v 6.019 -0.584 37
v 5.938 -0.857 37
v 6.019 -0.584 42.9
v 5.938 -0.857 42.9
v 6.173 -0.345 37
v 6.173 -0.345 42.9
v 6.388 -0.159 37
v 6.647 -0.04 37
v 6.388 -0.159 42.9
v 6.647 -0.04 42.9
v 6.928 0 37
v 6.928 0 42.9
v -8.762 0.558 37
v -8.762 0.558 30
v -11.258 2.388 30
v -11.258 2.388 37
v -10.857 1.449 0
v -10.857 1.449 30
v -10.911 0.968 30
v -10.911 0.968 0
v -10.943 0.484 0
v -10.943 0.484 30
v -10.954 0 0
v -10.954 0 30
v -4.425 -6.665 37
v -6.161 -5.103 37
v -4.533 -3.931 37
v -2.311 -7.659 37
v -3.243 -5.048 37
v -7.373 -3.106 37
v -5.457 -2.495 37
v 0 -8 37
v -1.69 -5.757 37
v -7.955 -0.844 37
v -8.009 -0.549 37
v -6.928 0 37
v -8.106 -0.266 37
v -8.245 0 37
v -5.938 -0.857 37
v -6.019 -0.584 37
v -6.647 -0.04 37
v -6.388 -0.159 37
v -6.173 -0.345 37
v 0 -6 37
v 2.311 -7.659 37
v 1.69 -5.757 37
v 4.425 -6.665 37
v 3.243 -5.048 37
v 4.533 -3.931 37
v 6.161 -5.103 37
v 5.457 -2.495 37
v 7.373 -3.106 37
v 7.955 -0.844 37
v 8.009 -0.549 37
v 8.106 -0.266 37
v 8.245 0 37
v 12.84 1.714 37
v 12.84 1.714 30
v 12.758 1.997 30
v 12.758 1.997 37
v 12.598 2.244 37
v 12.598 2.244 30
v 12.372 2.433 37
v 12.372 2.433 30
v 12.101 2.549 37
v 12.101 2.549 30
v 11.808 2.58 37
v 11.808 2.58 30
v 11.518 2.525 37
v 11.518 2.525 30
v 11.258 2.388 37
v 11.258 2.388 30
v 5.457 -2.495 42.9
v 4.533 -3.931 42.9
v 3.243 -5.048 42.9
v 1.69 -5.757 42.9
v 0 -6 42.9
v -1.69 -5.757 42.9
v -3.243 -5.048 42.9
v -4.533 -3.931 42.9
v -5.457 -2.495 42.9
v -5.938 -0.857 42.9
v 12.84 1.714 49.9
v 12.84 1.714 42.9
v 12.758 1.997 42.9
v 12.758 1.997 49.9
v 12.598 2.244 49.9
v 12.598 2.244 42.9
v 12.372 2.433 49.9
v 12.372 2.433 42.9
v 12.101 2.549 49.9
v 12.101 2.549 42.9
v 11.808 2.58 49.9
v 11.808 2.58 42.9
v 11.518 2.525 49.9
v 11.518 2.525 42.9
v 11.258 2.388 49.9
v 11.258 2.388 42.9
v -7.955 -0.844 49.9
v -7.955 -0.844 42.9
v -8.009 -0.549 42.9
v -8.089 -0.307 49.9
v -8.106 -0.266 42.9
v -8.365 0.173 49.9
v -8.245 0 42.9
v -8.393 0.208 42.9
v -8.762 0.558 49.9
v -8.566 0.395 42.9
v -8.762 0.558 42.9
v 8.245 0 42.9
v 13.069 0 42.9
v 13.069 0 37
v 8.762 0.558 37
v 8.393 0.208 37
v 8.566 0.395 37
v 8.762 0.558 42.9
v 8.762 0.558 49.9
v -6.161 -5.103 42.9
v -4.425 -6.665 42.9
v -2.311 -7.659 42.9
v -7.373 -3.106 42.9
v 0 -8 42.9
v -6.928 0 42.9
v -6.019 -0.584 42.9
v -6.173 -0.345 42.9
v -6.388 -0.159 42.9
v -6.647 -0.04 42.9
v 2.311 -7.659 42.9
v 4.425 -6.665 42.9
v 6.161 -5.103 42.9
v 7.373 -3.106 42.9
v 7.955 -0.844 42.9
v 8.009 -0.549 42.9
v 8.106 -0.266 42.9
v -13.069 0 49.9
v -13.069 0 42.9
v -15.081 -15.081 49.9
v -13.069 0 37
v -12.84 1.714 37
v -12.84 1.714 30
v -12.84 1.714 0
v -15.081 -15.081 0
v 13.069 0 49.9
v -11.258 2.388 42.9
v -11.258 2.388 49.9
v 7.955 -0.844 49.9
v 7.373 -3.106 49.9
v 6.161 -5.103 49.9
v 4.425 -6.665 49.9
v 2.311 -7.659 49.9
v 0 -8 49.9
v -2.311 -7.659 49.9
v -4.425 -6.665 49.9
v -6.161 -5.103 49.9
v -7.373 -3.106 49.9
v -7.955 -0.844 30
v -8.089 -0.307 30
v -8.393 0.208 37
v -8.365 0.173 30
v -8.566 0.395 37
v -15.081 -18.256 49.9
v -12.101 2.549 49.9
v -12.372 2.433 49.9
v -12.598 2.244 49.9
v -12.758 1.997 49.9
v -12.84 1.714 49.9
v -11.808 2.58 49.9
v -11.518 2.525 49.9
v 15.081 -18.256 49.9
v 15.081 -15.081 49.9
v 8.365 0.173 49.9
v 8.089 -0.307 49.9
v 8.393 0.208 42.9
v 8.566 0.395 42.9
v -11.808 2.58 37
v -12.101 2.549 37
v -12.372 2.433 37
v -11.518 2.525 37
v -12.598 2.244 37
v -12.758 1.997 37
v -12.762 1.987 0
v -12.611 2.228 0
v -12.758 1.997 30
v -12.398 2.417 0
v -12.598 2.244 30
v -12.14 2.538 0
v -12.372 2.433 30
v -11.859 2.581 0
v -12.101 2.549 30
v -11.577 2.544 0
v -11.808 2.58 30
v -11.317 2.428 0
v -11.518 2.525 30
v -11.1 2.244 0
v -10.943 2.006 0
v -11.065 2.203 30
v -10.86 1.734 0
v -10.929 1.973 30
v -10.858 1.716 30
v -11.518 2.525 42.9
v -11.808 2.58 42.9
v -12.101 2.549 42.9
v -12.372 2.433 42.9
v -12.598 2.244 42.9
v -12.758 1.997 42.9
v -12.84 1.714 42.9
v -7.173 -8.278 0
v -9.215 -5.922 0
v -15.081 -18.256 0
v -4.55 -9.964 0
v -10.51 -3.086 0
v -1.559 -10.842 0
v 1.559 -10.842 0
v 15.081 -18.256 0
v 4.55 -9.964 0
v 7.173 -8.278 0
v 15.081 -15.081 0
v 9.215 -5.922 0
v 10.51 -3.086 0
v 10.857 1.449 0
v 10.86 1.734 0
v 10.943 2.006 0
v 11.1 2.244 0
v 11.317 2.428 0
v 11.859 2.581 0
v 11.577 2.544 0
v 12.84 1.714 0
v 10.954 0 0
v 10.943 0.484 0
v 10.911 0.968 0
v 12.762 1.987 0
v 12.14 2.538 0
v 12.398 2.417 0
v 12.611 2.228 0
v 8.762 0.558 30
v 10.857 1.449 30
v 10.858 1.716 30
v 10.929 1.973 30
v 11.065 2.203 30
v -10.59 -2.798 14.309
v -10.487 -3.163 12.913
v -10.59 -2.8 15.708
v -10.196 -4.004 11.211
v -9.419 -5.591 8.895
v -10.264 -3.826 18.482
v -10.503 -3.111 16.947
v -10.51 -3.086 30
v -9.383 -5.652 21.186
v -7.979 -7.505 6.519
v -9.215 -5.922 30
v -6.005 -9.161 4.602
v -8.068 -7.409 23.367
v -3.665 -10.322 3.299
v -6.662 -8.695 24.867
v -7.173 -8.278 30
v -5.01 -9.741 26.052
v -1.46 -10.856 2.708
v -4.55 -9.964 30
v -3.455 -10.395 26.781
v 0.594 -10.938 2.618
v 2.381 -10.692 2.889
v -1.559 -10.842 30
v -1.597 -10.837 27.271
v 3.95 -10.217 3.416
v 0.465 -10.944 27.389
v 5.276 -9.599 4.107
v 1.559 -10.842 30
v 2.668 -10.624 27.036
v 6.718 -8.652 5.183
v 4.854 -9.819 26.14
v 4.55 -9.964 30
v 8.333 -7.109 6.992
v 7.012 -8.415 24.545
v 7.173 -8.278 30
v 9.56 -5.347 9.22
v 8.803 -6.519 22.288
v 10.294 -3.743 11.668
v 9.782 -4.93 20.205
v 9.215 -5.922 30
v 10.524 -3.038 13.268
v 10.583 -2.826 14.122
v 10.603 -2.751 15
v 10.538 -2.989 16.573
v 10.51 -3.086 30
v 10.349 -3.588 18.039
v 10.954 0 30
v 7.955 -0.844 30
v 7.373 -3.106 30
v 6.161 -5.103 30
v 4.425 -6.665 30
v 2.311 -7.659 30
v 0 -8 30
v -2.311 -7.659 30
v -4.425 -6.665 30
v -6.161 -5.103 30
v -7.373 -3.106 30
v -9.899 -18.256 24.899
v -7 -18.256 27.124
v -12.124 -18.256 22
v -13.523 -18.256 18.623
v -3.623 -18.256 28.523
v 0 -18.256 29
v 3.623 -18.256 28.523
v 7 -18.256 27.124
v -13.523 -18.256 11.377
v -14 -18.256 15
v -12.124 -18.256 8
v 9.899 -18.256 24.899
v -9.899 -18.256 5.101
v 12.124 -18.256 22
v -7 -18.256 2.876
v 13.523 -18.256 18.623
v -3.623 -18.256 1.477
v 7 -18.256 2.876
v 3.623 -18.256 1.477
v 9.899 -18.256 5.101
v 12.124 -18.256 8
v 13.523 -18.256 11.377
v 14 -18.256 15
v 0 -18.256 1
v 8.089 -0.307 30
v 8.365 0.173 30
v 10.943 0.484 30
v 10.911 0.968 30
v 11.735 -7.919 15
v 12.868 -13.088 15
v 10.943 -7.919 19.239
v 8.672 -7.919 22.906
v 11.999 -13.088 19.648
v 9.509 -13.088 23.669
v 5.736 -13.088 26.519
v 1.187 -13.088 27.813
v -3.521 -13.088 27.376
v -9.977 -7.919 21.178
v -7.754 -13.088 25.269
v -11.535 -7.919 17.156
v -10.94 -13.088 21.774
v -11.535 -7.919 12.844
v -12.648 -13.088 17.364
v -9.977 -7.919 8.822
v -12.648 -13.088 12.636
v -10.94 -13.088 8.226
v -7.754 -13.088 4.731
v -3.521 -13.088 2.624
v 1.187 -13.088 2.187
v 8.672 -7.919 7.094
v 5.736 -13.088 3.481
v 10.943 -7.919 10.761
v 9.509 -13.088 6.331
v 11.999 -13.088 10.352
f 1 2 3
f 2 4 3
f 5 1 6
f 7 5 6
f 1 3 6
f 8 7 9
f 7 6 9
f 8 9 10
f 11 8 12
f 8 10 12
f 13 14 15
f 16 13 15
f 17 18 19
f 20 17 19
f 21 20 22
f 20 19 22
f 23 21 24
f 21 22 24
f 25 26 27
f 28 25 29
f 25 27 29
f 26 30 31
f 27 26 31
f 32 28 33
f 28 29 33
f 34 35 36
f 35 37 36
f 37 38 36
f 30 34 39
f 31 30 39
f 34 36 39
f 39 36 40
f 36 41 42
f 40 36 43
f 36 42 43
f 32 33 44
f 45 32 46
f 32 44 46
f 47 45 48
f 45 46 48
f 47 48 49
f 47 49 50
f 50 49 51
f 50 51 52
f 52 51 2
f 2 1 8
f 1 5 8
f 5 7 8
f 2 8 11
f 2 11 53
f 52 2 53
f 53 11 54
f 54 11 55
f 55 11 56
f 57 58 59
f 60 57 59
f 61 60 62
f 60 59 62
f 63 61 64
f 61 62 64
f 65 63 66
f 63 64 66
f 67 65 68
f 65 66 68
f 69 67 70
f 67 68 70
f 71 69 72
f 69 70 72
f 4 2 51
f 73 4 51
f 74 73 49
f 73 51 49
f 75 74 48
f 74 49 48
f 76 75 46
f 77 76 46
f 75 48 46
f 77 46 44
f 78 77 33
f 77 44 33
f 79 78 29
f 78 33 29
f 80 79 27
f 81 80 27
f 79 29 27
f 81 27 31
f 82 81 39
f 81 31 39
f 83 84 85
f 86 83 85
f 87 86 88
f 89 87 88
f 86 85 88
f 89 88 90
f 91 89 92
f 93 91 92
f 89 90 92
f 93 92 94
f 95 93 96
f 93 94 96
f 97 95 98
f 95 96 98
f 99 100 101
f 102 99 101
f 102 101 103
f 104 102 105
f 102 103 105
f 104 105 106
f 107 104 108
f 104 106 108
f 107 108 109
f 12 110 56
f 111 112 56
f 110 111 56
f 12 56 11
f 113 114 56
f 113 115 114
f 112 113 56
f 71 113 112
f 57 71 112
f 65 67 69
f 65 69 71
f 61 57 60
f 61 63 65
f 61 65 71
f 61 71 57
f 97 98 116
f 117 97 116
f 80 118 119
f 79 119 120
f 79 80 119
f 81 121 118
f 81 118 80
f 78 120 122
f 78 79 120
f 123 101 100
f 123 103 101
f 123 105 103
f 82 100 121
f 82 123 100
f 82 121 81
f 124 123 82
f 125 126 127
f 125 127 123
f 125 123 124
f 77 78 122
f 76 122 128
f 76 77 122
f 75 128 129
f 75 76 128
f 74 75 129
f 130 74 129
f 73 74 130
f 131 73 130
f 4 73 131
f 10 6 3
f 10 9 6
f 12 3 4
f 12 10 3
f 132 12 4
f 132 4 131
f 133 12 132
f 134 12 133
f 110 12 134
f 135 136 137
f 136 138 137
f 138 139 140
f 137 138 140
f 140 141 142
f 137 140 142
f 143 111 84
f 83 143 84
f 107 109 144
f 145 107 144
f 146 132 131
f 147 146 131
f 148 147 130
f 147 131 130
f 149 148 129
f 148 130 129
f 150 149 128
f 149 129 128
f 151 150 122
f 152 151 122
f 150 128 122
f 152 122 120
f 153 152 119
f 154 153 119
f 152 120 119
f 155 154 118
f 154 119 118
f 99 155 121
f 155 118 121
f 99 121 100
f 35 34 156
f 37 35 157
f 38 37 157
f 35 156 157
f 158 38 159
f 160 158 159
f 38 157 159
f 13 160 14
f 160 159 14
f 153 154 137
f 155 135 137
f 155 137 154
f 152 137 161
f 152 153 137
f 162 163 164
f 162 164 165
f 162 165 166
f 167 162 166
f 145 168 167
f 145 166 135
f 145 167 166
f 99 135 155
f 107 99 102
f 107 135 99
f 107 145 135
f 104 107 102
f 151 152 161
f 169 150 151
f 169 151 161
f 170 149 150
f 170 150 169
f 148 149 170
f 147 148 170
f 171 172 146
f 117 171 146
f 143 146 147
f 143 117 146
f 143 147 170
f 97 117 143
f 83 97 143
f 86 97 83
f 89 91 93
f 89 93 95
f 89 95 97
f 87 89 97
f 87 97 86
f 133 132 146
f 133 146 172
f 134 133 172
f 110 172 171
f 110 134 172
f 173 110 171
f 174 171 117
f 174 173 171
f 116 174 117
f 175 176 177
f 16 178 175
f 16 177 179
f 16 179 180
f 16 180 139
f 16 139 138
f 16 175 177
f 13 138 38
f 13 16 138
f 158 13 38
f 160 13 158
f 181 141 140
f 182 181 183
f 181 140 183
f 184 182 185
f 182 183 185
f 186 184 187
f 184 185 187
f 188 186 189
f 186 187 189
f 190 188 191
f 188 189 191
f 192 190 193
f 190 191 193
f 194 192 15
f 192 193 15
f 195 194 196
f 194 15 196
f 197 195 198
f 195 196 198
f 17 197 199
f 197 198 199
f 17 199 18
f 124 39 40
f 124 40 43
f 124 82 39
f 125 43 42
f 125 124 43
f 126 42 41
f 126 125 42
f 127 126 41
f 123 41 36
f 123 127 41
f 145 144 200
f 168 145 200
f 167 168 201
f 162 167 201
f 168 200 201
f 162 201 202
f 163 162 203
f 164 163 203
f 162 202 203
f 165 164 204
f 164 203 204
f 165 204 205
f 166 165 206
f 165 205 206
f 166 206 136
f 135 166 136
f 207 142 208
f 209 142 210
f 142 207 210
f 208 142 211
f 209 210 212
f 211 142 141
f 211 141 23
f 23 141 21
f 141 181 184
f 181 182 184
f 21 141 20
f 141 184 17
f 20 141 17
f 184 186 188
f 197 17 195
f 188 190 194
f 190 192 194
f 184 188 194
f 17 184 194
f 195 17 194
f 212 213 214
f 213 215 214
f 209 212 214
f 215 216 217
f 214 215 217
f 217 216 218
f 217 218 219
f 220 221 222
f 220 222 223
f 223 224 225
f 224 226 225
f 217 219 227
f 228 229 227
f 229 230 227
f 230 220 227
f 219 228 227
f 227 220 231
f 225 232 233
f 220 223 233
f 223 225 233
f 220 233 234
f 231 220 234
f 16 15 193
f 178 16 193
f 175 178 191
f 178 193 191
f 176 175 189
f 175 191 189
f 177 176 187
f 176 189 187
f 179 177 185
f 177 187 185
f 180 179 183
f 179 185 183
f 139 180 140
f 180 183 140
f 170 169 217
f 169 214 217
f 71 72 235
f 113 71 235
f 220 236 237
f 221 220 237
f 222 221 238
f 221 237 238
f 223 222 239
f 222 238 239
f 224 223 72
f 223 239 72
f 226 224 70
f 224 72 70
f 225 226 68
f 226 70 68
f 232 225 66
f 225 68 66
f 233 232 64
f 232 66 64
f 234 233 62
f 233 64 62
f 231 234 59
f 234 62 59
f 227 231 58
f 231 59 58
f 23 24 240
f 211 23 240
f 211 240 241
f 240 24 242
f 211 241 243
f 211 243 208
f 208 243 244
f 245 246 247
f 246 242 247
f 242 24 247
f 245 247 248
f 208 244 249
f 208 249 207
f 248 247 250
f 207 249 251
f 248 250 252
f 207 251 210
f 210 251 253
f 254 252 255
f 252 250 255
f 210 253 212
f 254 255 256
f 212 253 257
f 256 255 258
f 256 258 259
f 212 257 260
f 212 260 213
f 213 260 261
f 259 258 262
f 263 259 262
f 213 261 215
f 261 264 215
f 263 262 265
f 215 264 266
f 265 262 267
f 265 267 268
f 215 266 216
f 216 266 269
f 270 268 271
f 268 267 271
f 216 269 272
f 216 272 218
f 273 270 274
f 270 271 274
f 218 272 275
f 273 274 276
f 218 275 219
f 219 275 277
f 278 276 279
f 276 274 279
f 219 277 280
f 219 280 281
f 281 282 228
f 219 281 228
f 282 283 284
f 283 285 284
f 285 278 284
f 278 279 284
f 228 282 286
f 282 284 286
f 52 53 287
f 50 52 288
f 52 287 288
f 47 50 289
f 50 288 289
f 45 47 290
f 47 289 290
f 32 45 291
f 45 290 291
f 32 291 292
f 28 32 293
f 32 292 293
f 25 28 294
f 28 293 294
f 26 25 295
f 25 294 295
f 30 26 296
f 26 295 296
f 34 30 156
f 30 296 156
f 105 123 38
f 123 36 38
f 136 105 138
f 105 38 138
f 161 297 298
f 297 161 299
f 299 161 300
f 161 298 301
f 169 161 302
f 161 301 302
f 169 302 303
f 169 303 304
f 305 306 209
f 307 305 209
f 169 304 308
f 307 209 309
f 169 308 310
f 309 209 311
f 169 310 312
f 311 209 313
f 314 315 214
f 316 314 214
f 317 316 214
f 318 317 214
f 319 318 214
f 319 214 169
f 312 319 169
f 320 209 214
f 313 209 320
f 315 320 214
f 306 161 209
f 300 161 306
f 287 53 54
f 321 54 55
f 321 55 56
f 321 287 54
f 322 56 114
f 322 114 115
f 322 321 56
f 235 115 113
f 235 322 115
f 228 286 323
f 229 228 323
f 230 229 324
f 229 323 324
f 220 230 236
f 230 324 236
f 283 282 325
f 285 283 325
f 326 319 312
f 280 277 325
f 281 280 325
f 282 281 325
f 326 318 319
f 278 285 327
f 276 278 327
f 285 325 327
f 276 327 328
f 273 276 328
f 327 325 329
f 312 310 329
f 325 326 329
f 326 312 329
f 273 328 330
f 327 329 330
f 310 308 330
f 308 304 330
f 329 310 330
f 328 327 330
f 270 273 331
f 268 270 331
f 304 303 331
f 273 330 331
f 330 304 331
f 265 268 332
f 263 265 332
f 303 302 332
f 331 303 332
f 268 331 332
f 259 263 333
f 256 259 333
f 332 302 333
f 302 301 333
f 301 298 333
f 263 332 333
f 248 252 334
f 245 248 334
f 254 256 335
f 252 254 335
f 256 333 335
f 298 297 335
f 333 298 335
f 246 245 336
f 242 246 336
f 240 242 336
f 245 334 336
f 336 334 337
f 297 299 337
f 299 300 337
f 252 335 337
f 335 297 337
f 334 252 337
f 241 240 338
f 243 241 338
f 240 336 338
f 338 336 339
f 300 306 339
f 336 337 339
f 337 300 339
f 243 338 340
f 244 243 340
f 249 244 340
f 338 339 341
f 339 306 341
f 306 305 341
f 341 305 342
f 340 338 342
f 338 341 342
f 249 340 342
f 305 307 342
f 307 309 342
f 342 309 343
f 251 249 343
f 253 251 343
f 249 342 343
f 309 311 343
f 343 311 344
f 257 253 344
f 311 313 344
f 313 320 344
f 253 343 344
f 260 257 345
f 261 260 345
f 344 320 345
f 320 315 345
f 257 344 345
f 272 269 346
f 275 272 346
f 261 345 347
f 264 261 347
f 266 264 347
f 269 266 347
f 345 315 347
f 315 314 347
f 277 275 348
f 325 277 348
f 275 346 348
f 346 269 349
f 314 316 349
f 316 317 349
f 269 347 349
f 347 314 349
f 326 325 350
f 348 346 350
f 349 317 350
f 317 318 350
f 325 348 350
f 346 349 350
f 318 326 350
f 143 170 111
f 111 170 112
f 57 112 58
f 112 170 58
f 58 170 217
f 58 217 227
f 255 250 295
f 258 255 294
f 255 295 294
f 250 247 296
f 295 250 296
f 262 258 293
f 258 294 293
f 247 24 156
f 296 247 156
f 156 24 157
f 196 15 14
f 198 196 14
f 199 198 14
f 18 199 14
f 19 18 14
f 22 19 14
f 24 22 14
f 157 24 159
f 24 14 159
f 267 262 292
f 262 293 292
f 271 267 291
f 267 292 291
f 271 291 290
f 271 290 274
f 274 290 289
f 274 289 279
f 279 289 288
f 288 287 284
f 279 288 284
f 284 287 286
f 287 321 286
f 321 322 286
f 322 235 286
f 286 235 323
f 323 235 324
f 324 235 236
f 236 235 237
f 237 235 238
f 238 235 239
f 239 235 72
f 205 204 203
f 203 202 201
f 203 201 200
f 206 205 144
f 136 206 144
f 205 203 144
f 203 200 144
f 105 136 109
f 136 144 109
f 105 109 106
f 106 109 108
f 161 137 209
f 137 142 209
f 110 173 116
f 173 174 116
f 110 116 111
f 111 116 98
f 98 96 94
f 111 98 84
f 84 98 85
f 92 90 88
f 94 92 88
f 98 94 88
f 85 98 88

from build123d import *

# Parameters (mm, degrees)
F0_W         = 50.8
F0_H         = 50.8
F1_DEPTH     = 30
F2_W         = 50.8
F2_H         = 50.8
F3_DEPTH     = 30
F5_R         = 10
F4_R         = 14
F8_DEPTH     = 7
F10_DEPTH    = 5.9
F12_DEPTH    = 7
F13_T1_DEPTH = 9.3614920568
F13_T3_DEPTH = 9.3614920568
F14_R        = 1


# Not quite as in the source:
# - a fillet or chamfer that OpenCascade refuses, or shapes differently, is made with other operations: its cross-section is extruded or revolved along the edge and cut away or added


with BuildPart() as f1:
    # F0 (on Top) → F1 (new body)
    with BuildSketch(Plane.XY):
        Rectangle(F0_W, F0_H)
    extrude(amount=F1_DEPTH)

    # F2 (on face) → F3 (cut, through all)
    with BuildSketch(Plane.XY.offset(30)):
        Rectangle(F2_W, F2_H)
        with BuildLine():
            ThreePointArc((-12.8399150562, 1.7135403152), (-11.7164214446, 2.5724711068), (-10.857490653, 1.4489774952))
            ThreePointArc((-10.857490653, 1.4489774952), (-10.9296586704, 0.7260856773), (-10.95375, 0))
            Line((-10.95375, 0), (10.95375, 0))
            ThreePointArc((10.95375, 0), (10.9296586704, 0.7260856773), (10.857490653, 1.4489774952))
            ThreePointArc((10.857490653, 1.4489774952), (11.7164214446, 2.5724711068), (12.8399150562, 1.7135403152))
            Line((12.8399150562, 1.7135403152), (15.08125, -15.08125))
            Line((15.08125, -15.08125), (15.08125, -18.25625))
            Line((15.08125, -18.25625), (-15.08125, -18.25625))
            Line((-15.08125, -18.25625), (-15.08125, -15.08125))
            Line((-15.08125, -15.08125), (-12.8399150562, 1.7135403152))
        make_face(mode=Mode.SUBTRACT)
        with BuildLine():
            Line((10.95375, 0), (-10.95375, 0))
            ThreePointArc((-10.95375, 0), (0, -10.95375), (10.95375, 0))
        make_face()
    extrude(amount=-F3_DEPTH, mode=Mode.SUBTRACT)

    # F5 (on Front) → F6 section 0
    with BuildSketch(Plane.XZ):
        with Locations((0, 15)):
            Circle(F5_R)
    # F4 (on face) → F6 section 1
    with BuildSketch(Plane.XZ.offset(18.25625)):
        with Locations((0, 15)):
            Circle(F4_R)
    loft(mode=Mode.SUBTRACT)

    # F7 (on face) → F8 (join)
    with BuildSketch(Plane.XY.offset(30)):
        with BuildLine():
            ThreePointArc((-10.857490653, 1.4489774952), (-10.9287333274, 1.9732487889), (-11.2575085067, 2.3877880386))
            ThreePointArc((-11.2575085067, 2.3877880386), (-12.2406927383, 2.5012284324), (-12.8399150562, 1.7135403152))
            Line((-12.8399150562, 1.7135403152), (-15.08125, -15.08125))
            Line((-15.08125, -15.08125), (-15.08125, -18.25625))
            Line((-15.08125, -18.25625), (15.08125, -18.25625))
            Line((15.08125, -18.25625), (15.08125, -15.08125))
            Line((15.08125, -15.08125), (12.8399150562, 1.7135403152))
            ThreePointArc((12.8399150562, 1.7135403152), (12.2406927383, 2.5012284324), (11.2575085067, 2.3877880386))
            ThreePointArc((11.2575085067, 2.3877880386), (10.9287333274, 1.9732487889), (10.857490653, 1.4489774952))
            ThreePointArc((10.8574906531, 1.4489774952), (0, -10.95375), (-10.857490653, 1.4489774952))
        make_face()
        with BuildLine():
            ThreePointArc((8, 0), (0, -8), (-8, 0))
            Line((-8, 0), (-11.2575085067, 2.3877880386))
            ThreePointArc((-11.2575085067, 2.3877880386), (-10.9287333274, 1.9732487889), (-10.857490653, 1.4489774952))
            ThreePointArc((-10.857490653, 1.4489774952), (0, -10.95375), (10.8574906531, 1.4489774952))
            ThreePointArc((10.857490653, 1.4489774952), (10.9287333274, 1.9732487889), (11.2575085067, 2.3877880386))
            Line((11.2575085067, 2.3877880386), (8, 0))
        make_face()
    extrude(amount=F8_DEPTH)

    # F9 (on face) → F10 (join)
    with BuildSketch(Plane.XY.offset(37)):
        with BuildLine():
            ThreePointArc((8, 0), (0, -8), (-8, 0))
            Line((-8, 0), (-13.0685941712, 0))
            Line((-13.0685941712, 0), (-15.08125, -15.08125))
            Line((-15.08125, -15.08125), (-15.08125, -18.25625))
            Line((-15.08125, -18.25625), (15.08125, -18.25625))
            Line((15.08125, -18.25625), (15.08125, -15.08125))
            Line((15.08125, -15.08125), (13.0685941712, 0))
            Line((13.0685941712, 0), (8, 0))
        make_face()
        with BuildLine():
            ThreePointArc((6, 0), (0, -6), (-6, 0))
            Line((-6, 0), (-8, 0))
            ThreePointArc((-8, 0), (0, -8), (8, 0))
            Line((8, 0), (6, 0))
        make_face()
    extrude(amount=F10_DEPTH)

    # F11 (on face) → F12 (join)
    with BuildSketch(Plane.XY.offset(42.9)):
        with BuildLine():
            Line((11.2575085067, 2.3877880386), (8, 0))
            Line((8, 0), (13.0685941712, 0))
            Line((13.0685941712, 0), (12.8399150562, 1.7135403152))
            ThreePointArc((12.8399150562, 1.7135403152), (12.2406927383, 2.5012284324), (11.2575085067, 2.3877880386))
        make_face()
        with BuildLine():
            Line((-13.0685941712, 0), (-8, 0))
            Line((-8, 0), (-11.2575085067, 2.3877880386))
            ThreePointArc((-11.2575085067, 2.3877880386), (-12.2406927383, 2.5012284324), (-12.8399150562, 1.7135403152))
            Line((-12.8399150562, 1.7135403152), (-13.0685941712, 0))
        make_face()
        with BuildLine():
            ThreePointArc((8, 0), (0, -8), (-8, 0))
            Line((-8, 0), (-13.0685941712, 0))
            Line((-13.0685941712, 0), (-15.08125, -15.08125))
            Line((-15.08125, -15.08125), (-15.08125, -18.25625))
            Line((-15.08125, -18.25625), (15.08125, -18.25625))
            Line((15.08125, -18.25625), (15.08125, -15.08125))
            Line((15.08125, -15.08125), (13.0685941712, 0))
            Line((13.0685941712, 0), (8, 0))
        make_face()
    extrude(amount=F12_DEPTH)

    # F13: fillet of radius 2 on 4 edges, made by hand

    # F13_s2 → F13_t1 (cut)
    with BuildSketch(Plane.XY.offset(42.9)):
        with BuildLine():
            ThreePointArc((-7.9553868421, -0.8436943713), (-8.2105441596, -0.0574614627), (-8.7618448568, 0.5584403027))
            Line((-8.7618448568, 0.5584403027), (-8, 0))
            ThreePointArc((-8, 0), (-7.9888389249, -0.4224365414), (-7.9553868421, -0.8436943713))
        make_face()
        with BuildLine():
            ThreePointArc((7.9553868421, -0.8436943713), (8.2105441596, -0.0574614627), (8.7618448568, 0.5584403027))
            Line((8.7618448568, 0.5584403027), (8, 0))
            ThreePointArc((8, 0), (7.9888389249, -0.4224365414), (7.9553868421, -0.8436943713))
        make_face()
    extrude(amount=F13_T1_DEPTH, mode=Mode.SUBTRACT)

    # F13_s4 → F13_t3 (cut)
    with BuildSketch(Plane.XY.offset(27.6385079432)):
        with BuildLine():
            ThreePointArc((-7.9553868421, -0.8436943713), (-8.2105441596, -0.0574614627), (-8.7618448568, 0.5584403027))
            Line((-8.7618448568, 0.5584403027), (-8, 0))
            ThreePointArc((-8, 0), (-7.9888389249, -0.4224365414), (-7.9553868421, -0.8436943713))
        make_face()
        with BuildLine():
            ThreePointArc((7.9553868421, -0.8436943713), (8.2105441596, -0.0574614627), (8.7618448568, 0.5584403027))
            Line((8.7618448568, 0.5584403027), (8, 0))
            ThreePointArc((8, 0), (7.9888389249, -0.4224365414), (7.9553868421, -0.8436943713))
        make_face()
    extrude(amount=F13_T3_DEPTH, mode=Mode.SUBTRACT)

    # F14
    f14_edges = [f1.edges().sort_by_distance(p)[0] for p in [
        (-6, 0, 39.95),
        (6, 0, 39.95),
    ]]
    fillet(f14_edges, radius=F14_R)


solid = f1.part
